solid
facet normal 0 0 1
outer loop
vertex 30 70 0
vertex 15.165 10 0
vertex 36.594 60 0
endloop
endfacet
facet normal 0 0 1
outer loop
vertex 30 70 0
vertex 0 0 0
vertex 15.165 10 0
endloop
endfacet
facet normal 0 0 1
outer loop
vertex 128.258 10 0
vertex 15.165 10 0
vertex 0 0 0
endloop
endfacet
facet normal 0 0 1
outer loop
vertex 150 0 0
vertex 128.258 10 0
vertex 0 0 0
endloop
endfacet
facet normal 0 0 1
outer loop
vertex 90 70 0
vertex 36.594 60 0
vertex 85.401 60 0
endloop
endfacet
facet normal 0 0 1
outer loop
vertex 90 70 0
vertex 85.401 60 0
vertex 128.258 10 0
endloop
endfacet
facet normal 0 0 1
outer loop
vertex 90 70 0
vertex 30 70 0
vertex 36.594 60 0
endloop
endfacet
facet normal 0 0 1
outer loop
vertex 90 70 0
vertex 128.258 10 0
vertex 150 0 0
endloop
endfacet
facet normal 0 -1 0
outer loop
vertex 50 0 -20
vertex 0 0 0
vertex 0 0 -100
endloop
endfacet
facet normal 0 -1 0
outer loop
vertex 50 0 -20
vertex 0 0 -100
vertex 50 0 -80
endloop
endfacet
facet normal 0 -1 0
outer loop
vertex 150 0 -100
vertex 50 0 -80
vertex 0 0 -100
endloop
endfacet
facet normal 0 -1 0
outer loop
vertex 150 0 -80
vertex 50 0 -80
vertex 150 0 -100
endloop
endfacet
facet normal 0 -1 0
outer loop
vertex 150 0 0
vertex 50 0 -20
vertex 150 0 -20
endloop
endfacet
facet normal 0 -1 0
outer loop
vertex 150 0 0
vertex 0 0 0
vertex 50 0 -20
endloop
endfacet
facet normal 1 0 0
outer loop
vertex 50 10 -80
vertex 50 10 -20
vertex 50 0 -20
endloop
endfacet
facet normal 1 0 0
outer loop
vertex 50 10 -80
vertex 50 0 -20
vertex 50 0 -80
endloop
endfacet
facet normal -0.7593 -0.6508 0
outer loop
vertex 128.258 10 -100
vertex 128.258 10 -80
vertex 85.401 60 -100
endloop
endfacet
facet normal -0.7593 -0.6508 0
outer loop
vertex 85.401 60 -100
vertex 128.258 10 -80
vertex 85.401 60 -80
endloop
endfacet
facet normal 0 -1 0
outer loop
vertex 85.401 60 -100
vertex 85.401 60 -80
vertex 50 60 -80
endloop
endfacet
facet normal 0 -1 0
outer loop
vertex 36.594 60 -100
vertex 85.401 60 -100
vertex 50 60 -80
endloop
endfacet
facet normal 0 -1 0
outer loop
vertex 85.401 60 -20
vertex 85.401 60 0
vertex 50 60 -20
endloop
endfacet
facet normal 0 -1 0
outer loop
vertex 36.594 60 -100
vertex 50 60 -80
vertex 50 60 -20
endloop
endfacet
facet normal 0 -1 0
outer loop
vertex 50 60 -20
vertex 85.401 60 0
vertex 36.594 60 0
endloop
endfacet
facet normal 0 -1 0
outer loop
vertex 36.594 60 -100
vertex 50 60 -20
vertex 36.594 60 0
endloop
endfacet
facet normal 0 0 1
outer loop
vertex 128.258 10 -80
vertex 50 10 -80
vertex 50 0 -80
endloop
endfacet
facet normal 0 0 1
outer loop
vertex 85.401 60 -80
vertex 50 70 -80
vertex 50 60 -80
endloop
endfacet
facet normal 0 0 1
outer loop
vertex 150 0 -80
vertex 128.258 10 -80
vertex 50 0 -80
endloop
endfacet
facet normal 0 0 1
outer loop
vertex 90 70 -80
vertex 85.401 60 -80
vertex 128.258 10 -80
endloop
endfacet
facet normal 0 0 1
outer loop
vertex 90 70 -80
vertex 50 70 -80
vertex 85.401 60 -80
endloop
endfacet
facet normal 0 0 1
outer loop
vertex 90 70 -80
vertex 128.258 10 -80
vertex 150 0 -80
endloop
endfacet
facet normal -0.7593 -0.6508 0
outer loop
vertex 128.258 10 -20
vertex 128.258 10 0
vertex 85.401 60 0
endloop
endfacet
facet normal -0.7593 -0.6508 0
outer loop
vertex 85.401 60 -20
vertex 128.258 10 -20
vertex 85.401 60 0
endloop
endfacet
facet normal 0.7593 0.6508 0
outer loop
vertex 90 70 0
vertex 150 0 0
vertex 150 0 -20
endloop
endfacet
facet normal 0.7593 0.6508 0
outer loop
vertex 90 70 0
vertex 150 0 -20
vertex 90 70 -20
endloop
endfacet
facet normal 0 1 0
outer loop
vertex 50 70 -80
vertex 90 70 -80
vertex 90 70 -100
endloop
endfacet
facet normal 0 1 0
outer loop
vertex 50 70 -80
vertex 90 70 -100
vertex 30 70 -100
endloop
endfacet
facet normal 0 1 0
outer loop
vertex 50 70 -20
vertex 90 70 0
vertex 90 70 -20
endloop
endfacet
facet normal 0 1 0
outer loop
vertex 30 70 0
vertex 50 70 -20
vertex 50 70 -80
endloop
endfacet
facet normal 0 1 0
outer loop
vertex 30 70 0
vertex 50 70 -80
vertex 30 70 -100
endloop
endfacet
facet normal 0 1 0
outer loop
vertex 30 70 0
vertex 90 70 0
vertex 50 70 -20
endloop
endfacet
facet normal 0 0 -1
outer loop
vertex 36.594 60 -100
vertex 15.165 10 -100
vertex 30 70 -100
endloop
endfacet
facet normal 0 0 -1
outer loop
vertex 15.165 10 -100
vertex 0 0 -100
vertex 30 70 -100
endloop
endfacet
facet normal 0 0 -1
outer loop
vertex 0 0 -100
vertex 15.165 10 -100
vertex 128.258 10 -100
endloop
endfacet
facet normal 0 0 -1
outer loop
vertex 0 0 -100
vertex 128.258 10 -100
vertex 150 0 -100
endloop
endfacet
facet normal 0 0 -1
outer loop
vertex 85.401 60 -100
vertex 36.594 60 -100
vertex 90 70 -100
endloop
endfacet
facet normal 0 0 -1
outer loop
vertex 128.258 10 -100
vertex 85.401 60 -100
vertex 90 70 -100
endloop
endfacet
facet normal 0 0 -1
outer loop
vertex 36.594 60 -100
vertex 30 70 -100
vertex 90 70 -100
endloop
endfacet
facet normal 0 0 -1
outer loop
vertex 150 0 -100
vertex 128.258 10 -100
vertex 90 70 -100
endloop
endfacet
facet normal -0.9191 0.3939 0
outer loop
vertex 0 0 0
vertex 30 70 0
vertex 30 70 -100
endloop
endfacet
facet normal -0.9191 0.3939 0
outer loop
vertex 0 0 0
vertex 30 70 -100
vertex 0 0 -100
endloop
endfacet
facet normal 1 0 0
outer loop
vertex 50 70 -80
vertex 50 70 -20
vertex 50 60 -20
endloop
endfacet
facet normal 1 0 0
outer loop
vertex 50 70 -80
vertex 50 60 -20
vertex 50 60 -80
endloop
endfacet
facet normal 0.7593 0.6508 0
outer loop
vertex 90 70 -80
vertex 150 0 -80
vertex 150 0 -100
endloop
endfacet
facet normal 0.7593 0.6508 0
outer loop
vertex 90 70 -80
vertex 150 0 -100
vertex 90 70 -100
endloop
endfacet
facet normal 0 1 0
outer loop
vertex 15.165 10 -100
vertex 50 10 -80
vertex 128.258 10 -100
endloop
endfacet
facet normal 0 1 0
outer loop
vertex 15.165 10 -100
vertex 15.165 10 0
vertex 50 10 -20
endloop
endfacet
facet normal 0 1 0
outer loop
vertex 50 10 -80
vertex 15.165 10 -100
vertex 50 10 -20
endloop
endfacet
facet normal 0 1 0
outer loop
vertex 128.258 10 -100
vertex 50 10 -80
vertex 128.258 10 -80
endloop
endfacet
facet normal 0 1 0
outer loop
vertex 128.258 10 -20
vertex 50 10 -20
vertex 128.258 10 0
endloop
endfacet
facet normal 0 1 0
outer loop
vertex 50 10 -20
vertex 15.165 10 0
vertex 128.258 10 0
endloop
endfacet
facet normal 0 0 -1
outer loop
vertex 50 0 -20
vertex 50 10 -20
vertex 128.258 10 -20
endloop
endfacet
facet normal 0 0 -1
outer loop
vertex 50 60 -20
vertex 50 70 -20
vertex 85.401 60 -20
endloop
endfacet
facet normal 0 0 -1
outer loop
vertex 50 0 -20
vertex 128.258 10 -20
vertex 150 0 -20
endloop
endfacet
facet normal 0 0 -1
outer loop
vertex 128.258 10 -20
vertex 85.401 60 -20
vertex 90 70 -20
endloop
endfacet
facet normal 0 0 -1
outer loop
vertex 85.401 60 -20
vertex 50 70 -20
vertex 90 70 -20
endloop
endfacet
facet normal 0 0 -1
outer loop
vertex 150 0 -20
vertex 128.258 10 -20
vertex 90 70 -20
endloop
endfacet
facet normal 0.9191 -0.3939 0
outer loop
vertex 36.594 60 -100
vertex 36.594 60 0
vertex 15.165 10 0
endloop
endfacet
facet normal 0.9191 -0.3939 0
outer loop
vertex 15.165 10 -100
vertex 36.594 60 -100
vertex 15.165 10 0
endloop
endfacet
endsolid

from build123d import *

# Parameters (mm, degrees)
BOSS_EXTRU_2_DEPTH      = 100
ENL_V_MAT_EXTRU_1_REACH = 72
ESQUISSE2_W             = 100
ESQUISSE2_H             = 60


with BuildPart() as part:
    # Esquisse1 → Boss.-Extru.2 (new body)
    with BuildSketch(Plane.XY):
        Polygon((0, 0), (150, 0), (90, 70), (30, 70), align=None)
        Polygon((36.59396158, 60), (15.165390151, 10), (128.257793632, 10), (85.400650775, 60), align=None, mode=Mode.SUBTRACT)
    extrude(amount=-BOSS_EXTRU_2_DEPTH)

    # Esquisse2 → Enlèv. mat.-Extru.1 (cut, up to next)
    with BuildSketch(Plane(origin=(0, 70, 0), x_dir=(1, 0, 0), z_dir=(0, 1, 0)), mode=Mode.PRIVATE) as enl_v_mat_extru_1_sk1:
        with Locations((100, 50)):
            Rectangle(ESQUISSE2_W, ESQUISSE2_H)
    enl_v_mat_extru_1_tool1 = extrude(enl_v_mat_extru_1_sk1.sketch, amount=-ENL_V_MAT_EXTRU_1_REACH, mode=Mode.PRIVATE) & part.part
    add(enl_v_mat_extru_1_tool1.solids().sort_by_distance((100, 70, -50))[0], mode=Mode.SUBTRACT)


solid = part.part
